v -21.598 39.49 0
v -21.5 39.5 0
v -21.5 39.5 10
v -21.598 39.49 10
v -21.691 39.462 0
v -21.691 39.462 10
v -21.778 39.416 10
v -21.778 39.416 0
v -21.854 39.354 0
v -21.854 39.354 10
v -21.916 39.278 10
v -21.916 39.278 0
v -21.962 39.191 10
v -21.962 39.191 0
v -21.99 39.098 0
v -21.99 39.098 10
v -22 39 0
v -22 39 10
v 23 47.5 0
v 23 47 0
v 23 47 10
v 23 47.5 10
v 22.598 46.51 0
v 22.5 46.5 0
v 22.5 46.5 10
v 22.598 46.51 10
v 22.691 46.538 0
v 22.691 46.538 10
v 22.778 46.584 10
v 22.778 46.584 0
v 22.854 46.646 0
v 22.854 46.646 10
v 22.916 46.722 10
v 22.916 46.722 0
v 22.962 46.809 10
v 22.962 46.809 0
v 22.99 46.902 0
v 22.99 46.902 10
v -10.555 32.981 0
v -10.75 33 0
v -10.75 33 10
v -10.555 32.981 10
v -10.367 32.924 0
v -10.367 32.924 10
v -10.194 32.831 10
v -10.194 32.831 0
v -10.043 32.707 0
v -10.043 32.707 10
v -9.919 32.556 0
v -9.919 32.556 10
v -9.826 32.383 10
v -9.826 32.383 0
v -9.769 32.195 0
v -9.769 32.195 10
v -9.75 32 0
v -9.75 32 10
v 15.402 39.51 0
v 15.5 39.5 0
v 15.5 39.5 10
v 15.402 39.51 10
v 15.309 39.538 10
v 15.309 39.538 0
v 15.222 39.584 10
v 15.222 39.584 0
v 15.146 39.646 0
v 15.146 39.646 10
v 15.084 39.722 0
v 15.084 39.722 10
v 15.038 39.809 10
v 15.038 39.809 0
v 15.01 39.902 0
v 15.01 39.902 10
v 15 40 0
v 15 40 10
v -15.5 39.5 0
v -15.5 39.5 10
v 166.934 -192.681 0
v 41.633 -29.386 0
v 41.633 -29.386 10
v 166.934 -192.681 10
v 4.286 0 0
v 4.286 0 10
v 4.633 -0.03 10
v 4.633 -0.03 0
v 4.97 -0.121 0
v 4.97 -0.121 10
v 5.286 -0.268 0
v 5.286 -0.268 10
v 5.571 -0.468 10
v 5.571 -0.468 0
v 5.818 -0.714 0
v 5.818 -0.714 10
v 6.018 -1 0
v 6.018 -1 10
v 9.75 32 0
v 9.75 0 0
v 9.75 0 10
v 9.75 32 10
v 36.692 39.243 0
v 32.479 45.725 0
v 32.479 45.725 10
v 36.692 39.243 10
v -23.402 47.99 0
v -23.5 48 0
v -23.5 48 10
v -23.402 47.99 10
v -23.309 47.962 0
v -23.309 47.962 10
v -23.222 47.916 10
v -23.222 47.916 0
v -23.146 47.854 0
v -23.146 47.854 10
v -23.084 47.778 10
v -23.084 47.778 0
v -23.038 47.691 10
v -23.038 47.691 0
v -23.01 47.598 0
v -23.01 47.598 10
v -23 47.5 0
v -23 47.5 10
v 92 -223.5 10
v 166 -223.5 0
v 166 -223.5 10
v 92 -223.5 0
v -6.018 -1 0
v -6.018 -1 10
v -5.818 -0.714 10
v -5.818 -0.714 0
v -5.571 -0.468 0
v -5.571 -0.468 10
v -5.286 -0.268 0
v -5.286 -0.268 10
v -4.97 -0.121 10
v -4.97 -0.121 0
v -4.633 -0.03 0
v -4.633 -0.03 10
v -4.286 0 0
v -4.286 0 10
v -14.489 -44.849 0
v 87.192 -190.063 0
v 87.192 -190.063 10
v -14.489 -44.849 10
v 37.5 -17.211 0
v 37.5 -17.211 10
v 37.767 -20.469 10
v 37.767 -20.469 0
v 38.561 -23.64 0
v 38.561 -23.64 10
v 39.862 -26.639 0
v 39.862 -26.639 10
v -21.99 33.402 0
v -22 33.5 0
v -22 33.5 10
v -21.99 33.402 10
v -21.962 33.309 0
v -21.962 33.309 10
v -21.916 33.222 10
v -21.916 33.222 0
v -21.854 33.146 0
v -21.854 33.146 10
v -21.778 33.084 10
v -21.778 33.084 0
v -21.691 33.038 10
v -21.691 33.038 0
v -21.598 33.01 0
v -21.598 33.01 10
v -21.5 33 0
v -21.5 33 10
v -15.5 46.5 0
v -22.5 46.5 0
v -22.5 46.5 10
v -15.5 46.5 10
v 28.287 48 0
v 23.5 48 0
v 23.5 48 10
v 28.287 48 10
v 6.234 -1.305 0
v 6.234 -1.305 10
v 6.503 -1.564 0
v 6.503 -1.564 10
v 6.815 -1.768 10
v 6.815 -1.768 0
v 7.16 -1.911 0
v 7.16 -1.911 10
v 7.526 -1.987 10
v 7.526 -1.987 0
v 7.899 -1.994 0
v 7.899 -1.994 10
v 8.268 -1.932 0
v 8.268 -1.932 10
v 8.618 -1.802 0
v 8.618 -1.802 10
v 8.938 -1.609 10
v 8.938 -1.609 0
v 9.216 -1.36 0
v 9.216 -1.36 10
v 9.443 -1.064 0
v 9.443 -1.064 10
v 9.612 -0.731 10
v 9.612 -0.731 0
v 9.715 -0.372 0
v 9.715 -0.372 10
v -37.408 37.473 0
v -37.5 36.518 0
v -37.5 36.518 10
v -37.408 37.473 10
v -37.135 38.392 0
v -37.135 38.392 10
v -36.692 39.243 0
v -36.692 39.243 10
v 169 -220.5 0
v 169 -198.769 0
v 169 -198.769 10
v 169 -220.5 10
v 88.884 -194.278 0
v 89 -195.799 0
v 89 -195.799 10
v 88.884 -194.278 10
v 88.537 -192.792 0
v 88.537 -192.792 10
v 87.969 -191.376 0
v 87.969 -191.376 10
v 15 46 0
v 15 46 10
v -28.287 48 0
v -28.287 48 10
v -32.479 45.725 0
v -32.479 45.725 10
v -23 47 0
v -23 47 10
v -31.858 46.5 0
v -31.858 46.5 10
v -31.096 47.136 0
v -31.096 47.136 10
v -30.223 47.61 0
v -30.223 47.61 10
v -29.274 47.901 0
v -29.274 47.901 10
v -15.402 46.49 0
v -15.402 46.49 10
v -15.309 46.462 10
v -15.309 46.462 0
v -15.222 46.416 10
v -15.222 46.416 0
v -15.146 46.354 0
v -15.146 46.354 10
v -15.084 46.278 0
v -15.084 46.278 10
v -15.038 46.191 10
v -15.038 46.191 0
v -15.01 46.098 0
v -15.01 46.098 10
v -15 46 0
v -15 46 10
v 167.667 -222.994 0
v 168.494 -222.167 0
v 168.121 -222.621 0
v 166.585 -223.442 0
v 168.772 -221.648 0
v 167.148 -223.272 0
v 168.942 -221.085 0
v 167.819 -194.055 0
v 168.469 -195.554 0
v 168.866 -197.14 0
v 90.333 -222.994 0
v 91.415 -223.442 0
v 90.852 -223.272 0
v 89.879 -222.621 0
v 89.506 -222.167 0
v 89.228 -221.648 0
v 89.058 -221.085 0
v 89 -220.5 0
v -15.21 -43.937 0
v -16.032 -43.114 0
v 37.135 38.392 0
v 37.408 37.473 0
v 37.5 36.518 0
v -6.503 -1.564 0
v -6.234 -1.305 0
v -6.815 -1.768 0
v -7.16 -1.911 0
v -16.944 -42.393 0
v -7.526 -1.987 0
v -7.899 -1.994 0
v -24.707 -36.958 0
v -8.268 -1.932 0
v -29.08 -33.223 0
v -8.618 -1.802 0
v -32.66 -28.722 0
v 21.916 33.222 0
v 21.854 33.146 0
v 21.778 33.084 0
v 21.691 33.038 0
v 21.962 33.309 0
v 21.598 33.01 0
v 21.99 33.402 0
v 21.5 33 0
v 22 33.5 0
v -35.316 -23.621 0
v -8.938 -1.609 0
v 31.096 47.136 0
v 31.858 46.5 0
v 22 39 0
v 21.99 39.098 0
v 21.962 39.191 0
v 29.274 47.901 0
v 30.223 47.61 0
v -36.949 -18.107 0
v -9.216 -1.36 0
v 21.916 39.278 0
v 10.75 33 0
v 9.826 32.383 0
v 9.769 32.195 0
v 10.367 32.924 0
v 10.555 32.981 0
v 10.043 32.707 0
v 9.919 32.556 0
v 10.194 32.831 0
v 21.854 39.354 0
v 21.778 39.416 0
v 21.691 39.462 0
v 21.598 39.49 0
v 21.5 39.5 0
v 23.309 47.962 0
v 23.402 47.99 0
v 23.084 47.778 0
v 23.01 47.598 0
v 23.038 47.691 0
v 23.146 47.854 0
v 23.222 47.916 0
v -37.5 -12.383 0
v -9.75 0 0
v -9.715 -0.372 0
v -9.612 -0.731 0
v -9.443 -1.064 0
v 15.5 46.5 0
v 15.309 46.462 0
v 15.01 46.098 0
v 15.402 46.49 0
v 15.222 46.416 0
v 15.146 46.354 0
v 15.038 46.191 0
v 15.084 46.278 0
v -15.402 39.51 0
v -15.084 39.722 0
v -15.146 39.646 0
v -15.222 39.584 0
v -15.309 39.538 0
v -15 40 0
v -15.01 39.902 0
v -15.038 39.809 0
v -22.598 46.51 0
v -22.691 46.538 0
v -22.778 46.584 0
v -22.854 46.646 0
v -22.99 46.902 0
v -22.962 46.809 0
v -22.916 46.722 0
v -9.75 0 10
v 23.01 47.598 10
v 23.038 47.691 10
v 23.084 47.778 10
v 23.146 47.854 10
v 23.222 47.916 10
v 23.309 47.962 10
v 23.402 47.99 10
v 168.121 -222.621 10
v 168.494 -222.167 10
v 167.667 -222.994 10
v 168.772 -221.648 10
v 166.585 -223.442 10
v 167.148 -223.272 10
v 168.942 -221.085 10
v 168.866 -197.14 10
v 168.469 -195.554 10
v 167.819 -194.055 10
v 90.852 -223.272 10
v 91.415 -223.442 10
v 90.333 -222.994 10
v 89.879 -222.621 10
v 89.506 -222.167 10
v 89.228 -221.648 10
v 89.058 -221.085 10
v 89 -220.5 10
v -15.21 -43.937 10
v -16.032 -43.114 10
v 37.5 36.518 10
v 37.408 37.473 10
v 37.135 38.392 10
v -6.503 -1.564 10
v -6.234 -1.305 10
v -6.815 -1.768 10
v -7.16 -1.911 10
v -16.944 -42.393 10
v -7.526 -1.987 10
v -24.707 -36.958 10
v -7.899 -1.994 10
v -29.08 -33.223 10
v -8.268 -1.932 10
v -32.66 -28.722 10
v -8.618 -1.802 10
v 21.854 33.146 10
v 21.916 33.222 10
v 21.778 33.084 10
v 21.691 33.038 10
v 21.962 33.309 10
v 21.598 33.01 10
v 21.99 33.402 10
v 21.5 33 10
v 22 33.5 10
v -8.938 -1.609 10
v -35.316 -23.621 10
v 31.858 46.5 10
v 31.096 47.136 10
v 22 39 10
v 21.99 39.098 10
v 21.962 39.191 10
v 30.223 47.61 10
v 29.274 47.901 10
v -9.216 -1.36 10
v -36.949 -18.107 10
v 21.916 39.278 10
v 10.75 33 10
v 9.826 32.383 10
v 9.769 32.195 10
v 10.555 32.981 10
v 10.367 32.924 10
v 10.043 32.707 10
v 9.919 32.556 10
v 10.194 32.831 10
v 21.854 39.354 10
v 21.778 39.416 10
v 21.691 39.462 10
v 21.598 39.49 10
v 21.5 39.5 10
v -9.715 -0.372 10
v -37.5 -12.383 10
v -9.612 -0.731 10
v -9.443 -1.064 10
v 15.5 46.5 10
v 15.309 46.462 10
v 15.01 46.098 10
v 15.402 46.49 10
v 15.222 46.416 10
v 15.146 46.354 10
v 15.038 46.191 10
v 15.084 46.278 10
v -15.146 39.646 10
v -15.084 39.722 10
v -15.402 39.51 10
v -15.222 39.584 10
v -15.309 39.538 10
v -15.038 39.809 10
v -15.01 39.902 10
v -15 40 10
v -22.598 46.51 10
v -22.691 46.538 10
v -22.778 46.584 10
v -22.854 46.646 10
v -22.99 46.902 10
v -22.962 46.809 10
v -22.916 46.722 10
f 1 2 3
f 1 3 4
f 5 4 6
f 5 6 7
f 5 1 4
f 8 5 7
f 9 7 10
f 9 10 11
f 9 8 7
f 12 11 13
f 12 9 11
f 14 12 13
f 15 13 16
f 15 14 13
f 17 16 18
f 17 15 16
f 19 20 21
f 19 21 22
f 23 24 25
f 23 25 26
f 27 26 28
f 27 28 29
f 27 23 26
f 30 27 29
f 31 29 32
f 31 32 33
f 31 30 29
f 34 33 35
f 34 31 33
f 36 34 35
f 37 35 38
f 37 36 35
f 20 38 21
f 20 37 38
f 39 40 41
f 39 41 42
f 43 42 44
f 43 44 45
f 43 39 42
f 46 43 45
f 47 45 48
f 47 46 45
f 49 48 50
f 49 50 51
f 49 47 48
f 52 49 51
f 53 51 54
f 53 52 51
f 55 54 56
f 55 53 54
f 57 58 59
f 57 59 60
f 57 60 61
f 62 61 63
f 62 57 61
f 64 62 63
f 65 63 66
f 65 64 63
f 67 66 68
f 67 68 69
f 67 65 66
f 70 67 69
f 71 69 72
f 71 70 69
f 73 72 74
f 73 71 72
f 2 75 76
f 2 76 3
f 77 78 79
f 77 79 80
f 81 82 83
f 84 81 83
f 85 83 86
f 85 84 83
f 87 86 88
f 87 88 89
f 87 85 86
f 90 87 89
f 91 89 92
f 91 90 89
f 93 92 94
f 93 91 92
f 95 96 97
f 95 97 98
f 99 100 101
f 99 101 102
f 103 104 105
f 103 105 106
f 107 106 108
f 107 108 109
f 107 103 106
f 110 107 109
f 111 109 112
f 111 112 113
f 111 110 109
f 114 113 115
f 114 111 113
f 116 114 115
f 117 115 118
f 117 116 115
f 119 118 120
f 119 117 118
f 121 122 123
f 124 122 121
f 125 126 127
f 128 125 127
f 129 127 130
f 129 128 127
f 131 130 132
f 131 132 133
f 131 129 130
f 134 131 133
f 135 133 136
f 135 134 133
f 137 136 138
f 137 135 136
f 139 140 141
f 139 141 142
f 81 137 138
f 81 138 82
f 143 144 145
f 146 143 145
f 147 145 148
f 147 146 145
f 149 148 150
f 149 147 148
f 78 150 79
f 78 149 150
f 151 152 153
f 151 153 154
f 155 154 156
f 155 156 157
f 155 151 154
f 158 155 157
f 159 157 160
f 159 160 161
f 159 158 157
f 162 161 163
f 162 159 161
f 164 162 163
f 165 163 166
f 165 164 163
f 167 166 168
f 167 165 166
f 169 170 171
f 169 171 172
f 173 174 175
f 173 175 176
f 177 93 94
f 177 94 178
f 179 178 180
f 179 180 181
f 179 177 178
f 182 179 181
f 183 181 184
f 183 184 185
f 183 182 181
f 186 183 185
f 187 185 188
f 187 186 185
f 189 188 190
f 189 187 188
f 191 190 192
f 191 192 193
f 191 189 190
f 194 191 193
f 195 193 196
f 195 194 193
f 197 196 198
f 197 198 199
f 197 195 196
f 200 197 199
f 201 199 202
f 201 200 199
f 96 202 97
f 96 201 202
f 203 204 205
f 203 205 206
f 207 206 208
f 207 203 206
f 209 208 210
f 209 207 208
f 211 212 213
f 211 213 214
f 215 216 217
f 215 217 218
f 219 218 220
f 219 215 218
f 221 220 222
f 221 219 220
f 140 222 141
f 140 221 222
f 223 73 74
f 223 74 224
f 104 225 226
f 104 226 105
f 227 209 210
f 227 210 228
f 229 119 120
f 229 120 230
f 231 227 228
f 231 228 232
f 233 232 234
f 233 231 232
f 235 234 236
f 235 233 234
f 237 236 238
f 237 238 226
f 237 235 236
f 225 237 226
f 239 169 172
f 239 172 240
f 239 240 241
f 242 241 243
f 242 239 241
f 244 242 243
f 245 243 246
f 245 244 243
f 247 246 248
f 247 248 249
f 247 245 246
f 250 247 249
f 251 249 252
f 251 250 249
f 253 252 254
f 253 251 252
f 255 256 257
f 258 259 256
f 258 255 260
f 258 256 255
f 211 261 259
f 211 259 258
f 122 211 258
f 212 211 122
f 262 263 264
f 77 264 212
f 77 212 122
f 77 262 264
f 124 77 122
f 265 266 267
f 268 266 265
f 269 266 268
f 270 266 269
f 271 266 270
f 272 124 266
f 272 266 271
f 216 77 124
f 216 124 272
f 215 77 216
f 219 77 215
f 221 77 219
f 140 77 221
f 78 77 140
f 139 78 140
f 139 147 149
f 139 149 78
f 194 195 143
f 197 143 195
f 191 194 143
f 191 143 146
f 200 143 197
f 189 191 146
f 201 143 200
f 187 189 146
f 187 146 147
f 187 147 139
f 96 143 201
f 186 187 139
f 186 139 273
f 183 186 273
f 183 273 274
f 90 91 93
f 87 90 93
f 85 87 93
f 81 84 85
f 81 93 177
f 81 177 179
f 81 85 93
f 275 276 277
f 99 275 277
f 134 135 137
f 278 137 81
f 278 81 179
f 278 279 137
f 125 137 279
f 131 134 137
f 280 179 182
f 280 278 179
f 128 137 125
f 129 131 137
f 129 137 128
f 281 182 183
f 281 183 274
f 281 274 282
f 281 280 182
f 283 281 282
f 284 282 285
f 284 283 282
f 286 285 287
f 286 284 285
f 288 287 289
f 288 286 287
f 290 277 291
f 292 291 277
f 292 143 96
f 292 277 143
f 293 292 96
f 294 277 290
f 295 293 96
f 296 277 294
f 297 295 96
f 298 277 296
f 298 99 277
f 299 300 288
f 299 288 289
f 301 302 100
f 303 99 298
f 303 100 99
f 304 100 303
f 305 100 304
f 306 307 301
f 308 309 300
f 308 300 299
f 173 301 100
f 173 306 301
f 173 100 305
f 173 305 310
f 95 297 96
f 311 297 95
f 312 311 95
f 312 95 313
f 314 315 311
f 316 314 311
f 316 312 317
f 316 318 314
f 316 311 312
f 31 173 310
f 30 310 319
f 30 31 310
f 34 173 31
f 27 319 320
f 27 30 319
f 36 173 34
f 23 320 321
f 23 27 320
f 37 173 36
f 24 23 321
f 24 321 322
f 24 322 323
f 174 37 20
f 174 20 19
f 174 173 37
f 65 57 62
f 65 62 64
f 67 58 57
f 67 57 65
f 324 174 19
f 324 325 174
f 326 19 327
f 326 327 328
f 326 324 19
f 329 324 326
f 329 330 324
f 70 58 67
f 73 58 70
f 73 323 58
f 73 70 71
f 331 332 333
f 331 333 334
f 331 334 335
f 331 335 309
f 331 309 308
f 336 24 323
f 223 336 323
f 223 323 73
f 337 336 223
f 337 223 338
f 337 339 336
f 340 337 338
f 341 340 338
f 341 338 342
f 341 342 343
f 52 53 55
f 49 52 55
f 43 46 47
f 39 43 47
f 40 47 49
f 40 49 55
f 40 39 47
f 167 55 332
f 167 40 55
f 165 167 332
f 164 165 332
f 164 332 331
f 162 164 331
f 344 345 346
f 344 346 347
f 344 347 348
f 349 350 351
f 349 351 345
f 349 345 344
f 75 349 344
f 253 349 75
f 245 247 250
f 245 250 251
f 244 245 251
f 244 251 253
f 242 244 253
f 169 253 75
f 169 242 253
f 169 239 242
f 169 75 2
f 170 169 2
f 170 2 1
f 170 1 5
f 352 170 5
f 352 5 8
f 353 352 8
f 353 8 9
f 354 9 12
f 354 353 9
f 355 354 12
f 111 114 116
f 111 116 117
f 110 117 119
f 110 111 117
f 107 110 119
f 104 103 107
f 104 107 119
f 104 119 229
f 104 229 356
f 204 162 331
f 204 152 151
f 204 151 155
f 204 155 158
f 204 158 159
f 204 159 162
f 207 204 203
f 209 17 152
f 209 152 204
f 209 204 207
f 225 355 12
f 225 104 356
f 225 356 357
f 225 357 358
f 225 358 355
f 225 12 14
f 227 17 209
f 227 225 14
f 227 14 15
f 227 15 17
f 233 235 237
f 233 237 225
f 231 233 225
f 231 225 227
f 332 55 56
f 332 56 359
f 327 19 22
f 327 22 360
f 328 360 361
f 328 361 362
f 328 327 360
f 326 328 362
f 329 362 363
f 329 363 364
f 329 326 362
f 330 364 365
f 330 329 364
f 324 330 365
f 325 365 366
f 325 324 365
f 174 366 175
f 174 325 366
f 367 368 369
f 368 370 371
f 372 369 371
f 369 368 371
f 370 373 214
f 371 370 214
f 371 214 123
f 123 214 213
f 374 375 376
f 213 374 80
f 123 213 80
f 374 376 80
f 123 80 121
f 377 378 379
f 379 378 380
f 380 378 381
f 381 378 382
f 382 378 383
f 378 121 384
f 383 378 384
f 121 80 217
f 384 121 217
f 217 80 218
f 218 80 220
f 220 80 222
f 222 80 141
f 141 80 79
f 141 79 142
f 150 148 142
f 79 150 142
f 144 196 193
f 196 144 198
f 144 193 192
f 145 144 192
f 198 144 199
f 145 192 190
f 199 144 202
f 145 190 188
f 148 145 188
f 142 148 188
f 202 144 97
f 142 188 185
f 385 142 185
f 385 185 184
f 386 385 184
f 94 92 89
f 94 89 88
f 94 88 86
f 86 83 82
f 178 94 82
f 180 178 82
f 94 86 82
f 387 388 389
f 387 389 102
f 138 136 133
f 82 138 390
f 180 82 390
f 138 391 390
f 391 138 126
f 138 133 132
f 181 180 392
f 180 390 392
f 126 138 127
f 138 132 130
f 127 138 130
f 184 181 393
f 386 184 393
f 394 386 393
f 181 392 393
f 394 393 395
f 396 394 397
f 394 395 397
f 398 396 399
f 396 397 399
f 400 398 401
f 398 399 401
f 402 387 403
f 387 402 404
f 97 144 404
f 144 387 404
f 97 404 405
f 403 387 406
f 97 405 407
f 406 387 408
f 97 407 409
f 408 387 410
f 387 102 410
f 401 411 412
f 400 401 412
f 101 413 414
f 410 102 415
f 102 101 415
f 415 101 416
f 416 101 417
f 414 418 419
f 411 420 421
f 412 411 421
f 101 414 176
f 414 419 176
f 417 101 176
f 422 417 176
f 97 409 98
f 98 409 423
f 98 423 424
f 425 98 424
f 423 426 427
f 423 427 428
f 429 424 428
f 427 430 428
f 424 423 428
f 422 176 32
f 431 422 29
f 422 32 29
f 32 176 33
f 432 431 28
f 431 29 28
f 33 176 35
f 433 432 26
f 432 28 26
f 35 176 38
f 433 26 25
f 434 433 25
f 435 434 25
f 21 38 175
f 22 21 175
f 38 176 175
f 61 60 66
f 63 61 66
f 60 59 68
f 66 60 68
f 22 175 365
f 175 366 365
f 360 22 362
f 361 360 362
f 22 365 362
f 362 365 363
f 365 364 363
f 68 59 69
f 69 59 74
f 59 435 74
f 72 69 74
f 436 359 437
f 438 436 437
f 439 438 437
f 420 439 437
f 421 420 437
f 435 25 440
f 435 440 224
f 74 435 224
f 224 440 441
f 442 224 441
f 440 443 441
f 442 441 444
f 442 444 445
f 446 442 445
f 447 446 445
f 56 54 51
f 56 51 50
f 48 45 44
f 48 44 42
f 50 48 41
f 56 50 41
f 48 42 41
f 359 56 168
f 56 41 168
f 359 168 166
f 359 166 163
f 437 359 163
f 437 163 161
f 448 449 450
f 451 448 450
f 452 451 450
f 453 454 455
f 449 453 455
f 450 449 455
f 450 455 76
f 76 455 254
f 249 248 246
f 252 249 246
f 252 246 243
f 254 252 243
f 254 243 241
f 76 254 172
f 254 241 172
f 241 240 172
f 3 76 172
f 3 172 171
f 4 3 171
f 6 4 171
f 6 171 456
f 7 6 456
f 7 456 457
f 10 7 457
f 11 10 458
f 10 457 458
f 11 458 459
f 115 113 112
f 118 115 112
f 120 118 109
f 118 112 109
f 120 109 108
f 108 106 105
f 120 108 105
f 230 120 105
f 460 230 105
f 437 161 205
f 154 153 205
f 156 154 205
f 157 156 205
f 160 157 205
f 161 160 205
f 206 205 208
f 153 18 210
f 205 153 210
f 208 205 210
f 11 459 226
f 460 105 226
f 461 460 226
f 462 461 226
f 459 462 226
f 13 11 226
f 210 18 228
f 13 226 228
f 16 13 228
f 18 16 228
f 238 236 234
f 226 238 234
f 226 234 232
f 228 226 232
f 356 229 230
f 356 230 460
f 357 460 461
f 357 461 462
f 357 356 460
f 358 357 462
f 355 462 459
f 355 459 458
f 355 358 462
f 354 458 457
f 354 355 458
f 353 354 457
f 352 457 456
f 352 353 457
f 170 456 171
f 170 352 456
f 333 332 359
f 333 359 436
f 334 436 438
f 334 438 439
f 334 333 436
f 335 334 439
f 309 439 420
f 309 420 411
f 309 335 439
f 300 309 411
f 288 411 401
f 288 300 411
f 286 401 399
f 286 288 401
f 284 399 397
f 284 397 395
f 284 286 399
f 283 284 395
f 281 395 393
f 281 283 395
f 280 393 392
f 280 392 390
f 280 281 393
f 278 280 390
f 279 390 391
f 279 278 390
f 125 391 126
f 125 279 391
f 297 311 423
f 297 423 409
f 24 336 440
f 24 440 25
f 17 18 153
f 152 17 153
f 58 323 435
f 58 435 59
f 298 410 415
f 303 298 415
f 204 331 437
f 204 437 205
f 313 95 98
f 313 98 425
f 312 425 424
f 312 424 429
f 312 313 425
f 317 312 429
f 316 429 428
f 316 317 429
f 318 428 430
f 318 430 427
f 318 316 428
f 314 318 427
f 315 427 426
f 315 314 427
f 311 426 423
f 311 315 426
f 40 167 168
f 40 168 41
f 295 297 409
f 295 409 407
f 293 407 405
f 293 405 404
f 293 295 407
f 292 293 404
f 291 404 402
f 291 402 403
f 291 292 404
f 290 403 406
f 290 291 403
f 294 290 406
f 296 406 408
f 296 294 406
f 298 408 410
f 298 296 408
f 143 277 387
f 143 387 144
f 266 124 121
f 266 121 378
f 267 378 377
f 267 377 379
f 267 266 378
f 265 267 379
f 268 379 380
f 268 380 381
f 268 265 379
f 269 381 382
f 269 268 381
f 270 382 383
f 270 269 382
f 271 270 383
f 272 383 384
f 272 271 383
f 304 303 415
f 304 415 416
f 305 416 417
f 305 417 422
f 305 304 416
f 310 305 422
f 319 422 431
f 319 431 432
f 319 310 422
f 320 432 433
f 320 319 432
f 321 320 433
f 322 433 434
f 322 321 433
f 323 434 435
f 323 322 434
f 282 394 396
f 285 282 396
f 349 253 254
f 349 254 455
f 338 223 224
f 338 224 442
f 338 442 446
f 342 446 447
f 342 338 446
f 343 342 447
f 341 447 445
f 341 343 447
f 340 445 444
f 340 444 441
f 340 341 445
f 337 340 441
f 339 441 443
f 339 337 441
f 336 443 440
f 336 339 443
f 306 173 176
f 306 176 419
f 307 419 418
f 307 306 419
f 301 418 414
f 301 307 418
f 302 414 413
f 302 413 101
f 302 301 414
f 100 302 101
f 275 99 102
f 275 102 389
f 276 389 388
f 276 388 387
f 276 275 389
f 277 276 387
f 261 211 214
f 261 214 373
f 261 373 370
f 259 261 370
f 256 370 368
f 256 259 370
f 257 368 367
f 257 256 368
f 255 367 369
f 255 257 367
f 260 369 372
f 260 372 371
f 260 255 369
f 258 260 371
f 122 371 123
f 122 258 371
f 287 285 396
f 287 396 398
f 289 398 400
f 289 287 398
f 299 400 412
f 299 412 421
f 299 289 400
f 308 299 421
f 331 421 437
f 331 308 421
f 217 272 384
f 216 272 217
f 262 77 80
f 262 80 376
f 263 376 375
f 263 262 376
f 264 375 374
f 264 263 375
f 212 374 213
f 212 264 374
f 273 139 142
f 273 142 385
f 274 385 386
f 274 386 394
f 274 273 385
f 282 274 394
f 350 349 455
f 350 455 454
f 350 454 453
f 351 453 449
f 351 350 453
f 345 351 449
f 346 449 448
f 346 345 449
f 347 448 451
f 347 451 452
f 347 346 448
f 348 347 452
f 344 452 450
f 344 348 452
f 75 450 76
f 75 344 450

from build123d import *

# Parameters (mm, degrees)
EXTRUDE1_DEPTH = 10


with BuildPart() as part:
    # Sketch1 → Extrude1 (new body)
    with BuildSketch(Plane.XY):
        with BuildLine():
            Line((-4.285898385, 0), (4.285898385, 0))
            ThreePointArc((4.285898385, 0), (5.285898385, -0.267949192), (6.017949192, -1))
            ThreePointArc((6.017949192, -1), (8.26763809, -1.931851653), (9.75, 0))
            Line((9.75, 0), (9.75, 32))
            ThreePointArc((9.75, 32), (10.042893219, 32.707106781), (10.75, 33))
            Line((10.75, 33), (21.5, 33))
            ThreePointArc((21.5, 33), (21.853553391, 33.146446609), (22, 33.5))
            Line((22, 33.5), (22, 39))
            ThreePointArc((22, 39), (21.853553391, 39.353553391), (21.5, 39.5))
            Line((21.5, 39.5), (15.5, 39.5))
            ThreePointArc((15.5, 39.5), (15.146446609, 39.646446609), (15, 40))
            Line((15, 40), (15, 46))
            ThreePointArc((15, 46), (15.146446609, 46.353553391), (15.5, 46.5))
            Line((15.5, 46.5), (22.5, 46.5))
            ThreePointArc((22.5, 46.5), (22.853553391, 46.646446609), (23, 47))
            Line((23, 47), (23, 47.5))
            ThreePointArc((23, 47.5), (23.146446609, 47.853553391), (23.5, 48))
            Line((23.5, 48), (28.286569779, 48))
            ThreePointArc((28.286569779, 48), (30.671448312, 47.39458239), (32.478787861, 45.724941753))
            Line((32.478787861, 45.724941753), (36.692218082, 39.242741413))
            ThreePointArc((36.692218082, 39.242741413), (37.293802791, 37.938874885), (37.5, 36.51779966))
            Line((37.5, 36.51779966), (37.5, -17.210914823))
            ThreePointArc((37.5, -17.210914823), (38.56139741, -23.639704129), (41.632933194, -29.386143403))
            Line((41.632933194, -29.386143403), (166.933533403, -192.681064827))
            ThreePointArc((166.933533403, -192.681064827), (168.469301295, -195.554284464), (169, -198.768679117))
            Line((169, -198.768679117), (169, -220.5))
            ThreePointArc((169, -220.5), (168.121320344, -222.621320344), (166, -223.5))
            Line((166, -223.5), (92, -223.5))
            ThreePointArc((92, -223.5), (89.878679656, -222.621320344), (89, -220.5))
            Line((89, -220.5), (89, -195.799020434))
            ThreePointArc((89, -195.799020434), (88.537169507, -192.791962439), (87.191520443, -190.06325607))
            Line((87.191520443, -190.06325607), (-14.488629988, -44.848951908))
            ThreePointArc((-14.488629988, -44.848951908), (-15.609082619, -43.513648459), (-16.944386067, -42.393195828))
            Line((-16.944386067, -42.393195828), (-24.707293091, -36.957549812))
            ThreePointArc((-24.707293091, -36.957549812), (-34.110324995, -26.23544688), (-37.5, -12.382988483))
            Line((-37.5, -12.382988483), (-37.5, 36.51779966))
            ThreePointArc((-37.5, 36.51779966), (-37.293802791, 37.938874885), (-36.692218082, 39.242741413))
            Line((-36.692218082, 39.242741413), (-32.478787861, 45.724941753))
            ThreePointArc((-32.478787861, 45.724941753), (-30.671448312, 47.39458239), (-28.286569779, 48))
            Line((-28.286569779, 48), (-23.5, 48))
            ThreePointArc((-23.5, 48), (-23.146446609, 47.853553391), (-23, 47.5))
            Line((-23, 47.5), (-23, 47))
            ThreePointArc((-23, 47), (-22.853553391, 46.646446609), (-22.5, 46.5))
            Line((-22.5, 46.5), (-15.5, 46.5))
            ThreePointArc((-15.5, 46.5), (-15.146446609, 46.353553391), (-15, 46))
            Line((-15, 46), (-15, 40))
            ThreePointArc((-15, 40), (-15.146446609, 39.646446609), (-15.5, 39.5))
            Line((-15.5, 39.5), (-21.5, 39.5))
            ThreePointArc((-21.5, 39.5), (-21.853553391, 39.353553391), (-22, 39))
            Line((-22, 39), (-22, 33.5))
            ThreePointArc((-22, 33.5), (-21.853553391, 33.146446609), (-21.5, 33))
            Line((-21.5, 33), (-10.75, 33))
            ThreePointArc((-10.75, 33), (-10.042893219, 32.707106781), (-9.75, 32))
            Line((-9.75, 32), (-9.75, 0))
            ThreePointArc((-9.75, 0), (-8.26763809, -1.931851653), (-6.017949192, -1))
            ThreePointArc((-6.017949192, -1), (-5.285898385, -0.267949192), (-4.285898385, 0))
        make_face()
    extrude(amount=EXTRUDE1_DEPTH)


solid = part.part
